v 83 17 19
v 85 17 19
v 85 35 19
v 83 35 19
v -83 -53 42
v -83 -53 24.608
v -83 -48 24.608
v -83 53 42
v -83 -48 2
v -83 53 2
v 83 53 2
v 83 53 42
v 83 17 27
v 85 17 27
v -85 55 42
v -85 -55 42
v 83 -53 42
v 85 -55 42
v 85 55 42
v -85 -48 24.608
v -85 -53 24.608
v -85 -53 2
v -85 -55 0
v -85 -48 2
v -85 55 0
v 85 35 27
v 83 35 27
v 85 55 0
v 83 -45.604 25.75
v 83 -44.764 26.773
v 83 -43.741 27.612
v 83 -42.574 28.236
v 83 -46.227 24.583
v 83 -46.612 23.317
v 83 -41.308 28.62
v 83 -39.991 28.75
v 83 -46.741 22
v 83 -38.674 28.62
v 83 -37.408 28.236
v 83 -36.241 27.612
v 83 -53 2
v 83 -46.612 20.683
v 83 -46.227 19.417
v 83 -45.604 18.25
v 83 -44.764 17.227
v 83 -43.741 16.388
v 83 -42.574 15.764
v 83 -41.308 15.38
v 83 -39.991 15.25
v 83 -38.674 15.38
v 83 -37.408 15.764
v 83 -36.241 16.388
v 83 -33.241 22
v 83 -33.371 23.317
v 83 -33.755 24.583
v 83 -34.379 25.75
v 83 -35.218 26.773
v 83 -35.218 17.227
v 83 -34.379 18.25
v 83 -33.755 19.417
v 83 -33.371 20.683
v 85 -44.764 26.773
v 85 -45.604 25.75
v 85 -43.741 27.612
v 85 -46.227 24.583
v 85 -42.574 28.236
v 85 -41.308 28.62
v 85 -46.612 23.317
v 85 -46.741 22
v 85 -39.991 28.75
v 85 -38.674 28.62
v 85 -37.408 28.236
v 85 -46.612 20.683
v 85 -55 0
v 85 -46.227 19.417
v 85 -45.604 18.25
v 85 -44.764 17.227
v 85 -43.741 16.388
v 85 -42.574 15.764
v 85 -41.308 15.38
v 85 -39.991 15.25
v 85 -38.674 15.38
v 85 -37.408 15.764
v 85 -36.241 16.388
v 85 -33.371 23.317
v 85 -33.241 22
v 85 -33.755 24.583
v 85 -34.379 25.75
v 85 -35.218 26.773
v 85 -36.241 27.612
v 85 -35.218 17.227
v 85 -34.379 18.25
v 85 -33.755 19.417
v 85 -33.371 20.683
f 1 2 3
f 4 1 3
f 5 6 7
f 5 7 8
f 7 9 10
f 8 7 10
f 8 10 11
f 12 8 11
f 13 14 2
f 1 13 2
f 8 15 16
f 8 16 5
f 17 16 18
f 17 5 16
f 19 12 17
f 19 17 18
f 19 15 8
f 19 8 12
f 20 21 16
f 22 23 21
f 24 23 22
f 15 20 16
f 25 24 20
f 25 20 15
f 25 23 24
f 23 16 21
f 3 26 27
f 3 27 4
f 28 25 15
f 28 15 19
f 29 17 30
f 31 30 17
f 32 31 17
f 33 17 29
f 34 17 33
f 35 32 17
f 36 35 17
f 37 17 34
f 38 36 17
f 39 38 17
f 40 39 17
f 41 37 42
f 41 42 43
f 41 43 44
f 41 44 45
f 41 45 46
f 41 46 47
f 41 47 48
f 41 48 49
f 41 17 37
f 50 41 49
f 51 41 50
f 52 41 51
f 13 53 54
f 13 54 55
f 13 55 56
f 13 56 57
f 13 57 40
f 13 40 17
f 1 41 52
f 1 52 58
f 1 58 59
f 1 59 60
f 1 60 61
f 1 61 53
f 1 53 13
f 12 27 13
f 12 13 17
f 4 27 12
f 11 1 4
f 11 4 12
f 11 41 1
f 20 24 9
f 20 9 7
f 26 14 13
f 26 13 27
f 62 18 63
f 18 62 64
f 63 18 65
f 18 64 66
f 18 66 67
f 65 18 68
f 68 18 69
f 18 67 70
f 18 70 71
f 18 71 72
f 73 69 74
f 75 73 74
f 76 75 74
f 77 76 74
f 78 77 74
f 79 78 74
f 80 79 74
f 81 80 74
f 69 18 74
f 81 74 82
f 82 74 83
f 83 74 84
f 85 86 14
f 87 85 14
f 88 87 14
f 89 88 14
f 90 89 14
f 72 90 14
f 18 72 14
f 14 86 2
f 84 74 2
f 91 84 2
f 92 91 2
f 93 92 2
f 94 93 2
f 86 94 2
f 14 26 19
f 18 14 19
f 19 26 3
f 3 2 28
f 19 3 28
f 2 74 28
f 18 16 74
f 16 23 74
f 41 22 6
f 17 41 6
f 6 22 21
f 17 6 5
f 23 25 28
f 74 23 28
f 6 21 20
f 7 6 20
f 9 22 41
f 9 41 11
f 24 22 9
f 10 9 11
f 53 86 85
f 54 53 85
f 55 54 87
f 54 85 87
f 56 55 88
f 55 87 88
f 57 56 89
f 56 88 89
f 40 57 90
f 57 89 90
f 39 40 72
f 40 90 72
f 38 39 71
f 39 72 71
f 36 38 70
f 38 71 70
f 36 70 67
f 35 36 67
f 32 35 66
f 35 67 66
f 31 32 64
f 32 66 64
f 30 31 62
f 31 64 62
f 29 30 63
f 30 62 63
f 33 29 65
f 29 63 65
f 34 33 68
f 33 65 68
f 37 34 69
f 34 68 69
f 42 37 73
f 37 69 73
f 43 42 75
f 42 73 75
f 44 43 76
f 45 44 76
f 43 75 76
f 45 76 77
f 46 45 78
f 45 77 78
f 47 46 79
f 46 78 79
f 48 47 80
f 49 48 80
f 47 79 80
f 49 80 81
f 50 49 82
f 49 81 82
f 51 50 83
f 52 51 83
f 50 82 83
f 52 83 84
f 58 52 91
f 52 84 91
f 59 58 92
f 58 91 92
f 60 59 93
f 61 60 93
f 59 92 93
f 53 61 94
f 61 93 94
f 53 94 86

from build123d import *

# Parameters (mm, degrees)
SKETCH1_W           = 170
SKETCH1_H           = 110
BOSS_EXTRUDE1_DEPTH = 2
SKETCH2_W           = 170
SKETCH2_H           = 110
SKETCH2_W_2         = 166
SKETCH2_H_2         = 106
BOSS_EXTRUDE2_DEPTH = 40
SKETCH3_R           = 6.75
SKETCH3_W           = 8
SKETCH3_H           = 18
CUT_EXTRUDE1_DEPTH  = 2
SKETCH4_W           = 22.608078914
SKETCH4_H           = 5
CUT_EXTRUDE2_DEPTH  = 2


with BuildPart() as part:
    # Sketch1 → Boss-Extrude1 (new body)
    with BuildSketch(Plane.XY):
        Rectangle(SKETCH1_W, SKETCH1_H)
    extrude(amount=BOSS_EXTRUDE1_DEPTH)

    # Sketch2 → Boss-Extrude2 (add)
    with BuildSketch(Plane.XY.offset(2)):
        Rectangle(SKETCH2_W, SKETCH2_H)
        Rectangle(SKETCH2_W_2, SKETCH2_H_2, mode=Mode.SUBTRACT)
    extrude(amount=BOSS_EXTRUDE2_DEPTH)

    # Sketch3 → Cut-Extrude1 (cut)
    with BuildSketch(Plane(origin=(85, 0, 0), x_dir=(0, 0, -1), z_dir=(1, 0, 0))):
        with Locations(Location((-22, -39.991227395, 0), (0, 0, 90))):
            Circle(SKETCH3_R)
        with Locations((-23, 26)):
            Rectangle(SKETCH3_W, SKETCH3_H)
    extrude(amount=-CUT_EXTRUDE1_DEPTH, mode=Mode.SUBTRACT)

    # Sketch4 → Cut-Extrude2 (cut)
    with BuildSketch(Plane.ZY.offset(85)):
        with Locations((13.304039457, -50.5)):
            Rectangle(SKETCH4_W, SKETCH4_H)
    extrude(amount=-CUT_EXTRUDE2_DEPTH, mode=Mode.SUBTRACT)


solid = part.part
